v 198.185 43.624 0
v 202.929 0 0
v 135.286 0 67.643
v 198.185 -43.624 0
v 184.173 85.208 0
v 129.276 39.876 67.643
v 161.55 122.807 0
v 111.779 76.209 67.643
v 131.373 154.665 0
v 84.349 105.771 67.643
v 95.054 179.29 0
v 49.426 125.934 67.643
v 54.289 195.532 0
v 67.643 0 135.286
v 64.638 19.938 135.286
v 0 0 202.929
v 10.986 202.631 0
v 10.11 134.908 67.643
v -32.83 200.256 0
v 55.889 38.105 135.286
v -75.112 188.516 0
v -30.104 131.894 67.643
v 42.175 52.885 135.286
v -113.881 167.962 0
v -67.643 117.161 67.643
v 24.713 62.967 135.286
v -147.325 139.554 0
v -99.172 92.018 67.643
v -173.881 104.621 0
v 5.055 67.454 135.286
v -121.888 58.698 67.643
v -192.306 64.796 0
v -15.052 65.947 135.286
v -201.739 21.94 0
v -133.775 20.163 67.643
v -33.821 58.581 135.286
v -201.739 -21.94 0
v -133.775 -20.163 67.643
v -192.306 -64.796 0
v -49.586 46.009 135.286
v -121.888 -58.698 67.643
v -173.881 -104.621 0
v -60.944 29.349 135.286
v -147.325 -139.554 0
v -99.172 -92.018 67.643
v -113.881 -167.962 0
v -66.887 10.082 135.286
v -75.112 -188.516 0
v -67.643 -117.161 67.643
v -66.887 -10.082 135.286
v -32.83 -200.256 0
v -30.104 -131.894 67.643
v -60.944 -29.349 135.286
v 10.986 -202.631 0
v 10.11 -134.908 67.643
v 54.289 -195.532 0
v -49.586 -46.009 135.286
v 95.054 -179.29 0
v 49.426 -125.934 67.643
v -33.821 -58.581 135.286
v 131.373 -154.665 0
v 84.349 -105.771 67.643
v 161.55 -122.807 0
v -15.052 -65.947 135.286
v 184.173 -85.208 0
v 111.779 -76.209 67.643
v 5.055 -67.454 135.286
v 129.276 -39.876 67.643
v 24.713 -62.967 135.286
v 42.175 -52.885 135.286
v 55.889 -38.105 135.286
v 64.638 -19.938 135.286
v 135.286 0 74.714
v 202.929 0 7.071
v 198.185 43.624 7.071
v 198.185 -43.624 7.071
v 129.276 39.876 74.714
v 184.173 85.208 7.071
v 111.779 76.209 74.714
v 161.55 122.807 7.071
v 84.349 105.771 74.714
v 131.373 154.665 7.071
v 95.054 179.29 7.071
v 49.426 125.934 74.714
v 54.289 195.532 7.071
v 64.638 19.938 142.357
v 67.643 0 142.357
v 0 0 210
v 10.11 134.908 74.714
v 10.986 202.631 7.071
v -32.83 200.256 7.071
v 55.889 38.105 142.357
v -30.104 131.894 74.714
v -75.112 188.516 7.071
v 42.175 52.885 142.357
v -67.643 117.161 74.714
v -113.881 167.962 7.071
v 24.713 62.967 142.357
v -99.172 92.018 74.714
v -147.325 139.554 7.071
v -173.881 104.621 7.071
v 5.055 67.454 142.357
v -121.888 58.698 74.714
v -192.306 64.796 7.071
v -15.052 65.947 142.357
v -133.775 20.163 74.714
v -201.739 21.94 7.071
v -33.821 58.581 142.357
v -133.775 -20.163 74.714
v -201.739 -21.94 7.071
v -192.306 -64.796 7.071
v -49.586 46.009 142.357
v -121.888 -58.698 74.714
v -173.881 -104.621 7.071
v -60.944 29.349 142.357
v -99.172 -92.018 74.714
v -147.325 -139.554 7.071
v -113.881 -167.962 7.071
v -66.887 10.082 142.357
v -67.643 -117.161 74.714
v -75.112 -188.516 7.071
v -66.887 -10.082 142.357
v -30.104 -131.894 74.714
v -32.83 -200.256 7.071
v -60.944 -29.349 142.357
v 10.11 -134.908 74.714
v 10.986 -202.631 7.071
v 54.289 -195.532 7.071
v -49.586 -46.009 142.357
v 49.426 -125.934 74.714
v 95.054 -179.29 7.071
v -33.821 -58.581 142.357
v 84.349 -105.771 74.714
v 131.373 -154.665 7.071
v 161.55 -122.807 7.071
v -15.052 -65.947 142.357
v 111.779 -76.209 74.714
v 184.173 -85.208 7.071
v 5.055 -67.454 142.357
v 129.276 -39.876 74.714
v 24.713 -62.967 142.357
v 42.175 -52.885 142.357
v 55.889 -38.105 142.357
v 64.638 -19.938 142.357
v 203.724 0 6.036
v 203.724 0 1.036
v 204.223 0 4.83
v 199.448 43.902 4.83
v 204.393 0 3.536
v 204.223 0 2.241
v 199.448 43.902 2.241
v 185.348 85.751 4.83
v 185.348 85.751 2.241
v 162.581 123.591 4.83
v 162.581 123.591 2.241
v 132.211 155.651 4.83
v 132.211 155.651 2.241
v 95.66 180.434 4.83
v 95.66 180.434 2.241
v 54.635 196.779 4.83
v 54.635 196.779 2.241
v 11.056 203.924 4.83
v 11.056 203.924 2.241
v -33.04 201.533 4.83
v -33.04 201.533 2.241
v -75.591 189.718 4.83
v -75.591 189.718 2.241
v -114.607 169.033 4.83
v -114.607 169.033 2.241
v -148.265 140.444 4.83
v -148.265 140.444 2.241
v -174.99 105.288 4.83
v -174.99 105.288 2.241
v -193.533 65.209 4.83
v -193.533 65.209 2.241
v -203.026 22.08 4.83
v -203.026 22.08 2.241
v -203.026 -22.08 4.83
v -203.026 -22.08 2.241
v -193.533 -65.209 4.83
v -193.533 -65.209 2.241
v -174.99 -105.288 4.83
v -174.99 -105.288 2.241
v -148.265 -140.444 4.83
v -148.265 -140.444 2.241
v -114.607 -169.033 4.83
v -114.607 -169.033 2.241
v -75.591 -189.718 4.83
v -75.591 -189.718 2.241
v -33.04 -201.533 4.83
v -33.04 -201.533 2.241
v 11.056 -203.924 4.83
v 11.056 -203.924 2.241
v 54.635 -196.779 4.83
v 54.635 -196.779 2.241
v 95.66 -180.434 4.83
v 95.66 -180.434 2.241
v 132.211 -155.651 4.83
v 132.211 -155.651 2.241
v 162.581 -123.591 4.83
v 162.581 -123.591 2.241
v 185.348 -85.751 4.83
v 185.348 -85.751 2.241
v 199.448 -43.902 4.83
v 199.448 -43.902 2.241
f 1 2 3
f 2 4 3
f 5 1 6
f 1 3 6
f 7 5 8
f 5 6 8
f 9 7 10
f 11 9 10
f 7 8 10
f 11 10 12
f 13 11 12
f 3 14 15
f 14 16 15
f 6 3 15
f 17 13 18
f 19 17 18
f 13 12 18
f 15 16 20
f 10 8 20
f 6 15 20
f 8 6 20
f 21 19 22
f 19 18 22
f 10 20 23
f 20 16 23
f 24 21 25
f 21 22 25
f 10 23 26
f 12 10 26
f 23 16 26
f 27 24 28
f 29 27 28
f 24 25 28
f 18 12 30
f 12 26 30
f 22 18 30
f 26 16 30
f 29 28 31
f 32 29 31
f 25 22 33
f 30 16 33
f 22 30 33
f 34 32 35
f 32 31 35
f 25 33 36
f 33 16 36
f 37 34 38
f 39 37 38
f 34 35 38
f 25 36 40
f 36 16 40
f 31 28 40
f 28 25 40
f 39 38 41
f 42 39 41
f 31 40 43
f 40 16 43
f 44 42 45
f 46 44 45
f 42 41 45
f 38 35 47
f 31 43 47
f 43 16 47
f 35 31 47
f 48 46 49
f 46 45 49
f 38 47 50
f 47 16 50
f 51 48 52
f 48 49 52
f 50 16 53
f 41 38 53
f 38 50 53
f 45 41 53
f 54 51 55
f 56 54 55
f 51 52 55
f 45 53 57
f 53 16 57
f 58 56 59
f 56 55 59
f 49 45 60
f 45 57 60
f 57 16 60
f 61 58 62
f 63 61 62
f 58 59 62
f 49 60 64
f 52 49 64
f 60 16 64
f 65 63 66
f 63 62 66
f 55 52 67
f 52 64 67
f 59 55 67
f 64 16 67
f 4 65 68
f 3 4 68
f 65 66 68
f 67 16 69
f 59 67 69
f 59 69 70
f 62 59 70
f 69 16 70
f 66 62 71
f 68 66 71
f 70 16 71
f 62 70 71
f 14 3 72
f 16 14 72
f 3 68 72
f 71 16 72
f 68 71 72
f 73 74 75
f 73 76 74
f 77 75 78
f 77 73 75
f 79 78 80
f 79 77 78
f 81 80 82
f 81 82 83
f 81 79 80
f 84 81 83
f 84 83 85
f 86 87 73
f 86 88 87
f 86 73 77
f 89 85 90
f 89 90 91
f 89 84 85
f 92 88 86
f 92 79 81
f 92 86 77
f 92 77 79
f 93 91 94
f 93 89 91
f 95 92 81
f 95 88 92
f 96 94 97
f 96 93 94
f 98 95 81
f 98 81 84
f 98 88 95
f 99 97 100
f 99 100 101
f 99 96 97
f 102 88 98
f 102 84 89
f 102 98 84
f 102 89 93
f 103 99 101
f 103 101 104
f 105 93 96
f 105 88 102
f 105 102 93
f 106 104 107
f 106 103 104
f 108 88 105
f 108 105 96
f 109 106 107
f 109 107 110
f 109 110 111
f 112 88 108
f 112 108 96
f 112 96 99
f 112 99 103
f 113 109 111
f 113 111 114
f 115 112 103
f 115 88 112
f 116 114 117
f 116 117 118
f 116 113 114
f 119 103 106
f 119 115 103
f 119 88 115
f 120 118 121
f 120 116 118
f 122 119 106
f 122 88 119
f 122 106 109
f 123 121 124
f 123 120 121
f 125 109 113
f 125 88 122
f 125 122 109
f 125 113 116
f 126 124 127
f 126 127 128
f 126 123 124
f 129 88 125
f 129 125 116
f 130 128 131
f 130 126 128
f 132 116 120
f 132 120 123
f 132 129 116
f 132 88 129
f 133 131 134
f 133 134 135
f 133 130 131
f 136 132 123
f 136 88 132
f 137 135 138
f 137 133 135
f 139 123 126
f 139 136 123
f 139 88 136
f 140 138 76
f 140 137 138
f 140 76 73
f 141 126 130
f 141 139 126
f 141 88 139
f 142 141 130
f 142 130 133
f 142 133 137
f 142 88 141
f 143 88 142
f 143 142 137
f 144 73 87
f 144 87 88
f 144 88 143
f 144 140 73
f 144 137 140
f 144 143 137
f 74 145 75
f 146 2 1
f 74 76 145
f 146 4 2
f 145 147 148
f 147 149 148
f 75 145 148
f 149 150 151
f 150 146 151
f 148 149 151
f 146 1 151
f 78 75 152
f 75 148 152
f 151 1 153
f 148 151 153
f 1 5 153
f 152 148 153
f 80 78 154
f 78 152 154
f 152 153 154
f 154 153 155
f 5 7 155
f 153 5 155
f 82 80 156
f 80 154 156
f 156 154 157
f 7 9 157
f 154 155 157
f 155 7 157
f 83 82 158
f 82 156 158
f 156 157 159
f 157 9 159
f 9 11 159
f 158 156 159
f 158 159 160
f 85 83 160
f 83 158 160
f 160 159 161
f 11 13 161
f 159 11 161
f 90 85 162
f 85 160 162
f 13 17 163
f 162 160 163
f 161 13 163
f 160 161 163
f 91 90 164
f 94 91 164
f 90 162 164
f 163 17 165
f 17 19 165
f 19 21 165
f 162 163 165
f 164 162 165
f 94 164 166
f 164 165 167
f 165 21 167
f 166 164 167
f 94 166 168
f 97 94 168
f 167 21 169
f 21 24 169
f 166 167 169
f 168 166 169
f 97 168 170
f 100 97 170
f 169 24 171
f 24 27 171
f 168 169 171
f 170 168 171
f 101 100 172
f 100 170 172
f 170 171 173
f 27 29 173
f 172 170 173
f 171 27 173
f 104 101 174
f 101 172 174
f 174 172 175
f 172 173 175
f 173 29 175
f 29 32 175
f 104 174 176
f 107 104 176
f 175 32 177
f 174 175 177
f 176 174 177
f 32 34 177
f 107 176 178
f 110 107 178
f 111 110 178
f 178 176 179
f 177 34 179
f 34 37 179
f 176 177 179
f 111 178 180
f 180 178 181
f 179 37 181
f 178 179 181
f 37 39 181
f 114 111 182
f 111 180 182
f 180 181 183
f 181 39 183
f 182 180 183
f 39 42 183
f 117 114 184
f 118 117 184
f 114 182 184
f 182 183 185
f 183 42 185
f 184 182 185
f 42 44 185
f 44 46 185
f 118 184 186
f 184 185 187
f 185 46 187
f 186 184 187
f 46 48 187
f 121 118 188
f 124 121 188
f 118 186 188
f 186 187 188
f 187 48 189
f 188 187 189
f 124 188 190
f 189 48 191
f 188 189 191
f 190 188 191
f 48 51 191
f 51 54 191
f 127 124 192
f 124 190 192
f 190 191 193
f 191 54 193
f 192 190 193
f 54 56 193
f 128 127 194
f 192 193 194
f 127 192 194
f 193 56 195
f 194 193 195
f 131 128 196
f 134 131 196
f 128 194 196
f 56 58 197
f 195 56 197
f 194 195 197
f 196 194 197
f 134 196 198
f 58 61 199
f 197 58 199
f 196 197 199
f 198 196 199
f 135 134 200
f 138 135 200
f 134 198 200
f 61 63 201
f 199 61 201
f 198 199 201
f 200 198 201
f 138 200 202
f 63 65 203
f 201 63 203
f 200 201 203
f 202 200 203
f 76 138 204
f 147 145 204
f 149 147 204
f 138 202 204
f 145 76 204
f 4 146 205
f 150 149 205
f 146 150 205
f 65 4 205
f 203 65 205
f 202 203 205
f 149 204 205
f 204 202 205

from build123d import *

# Parameters (mm, degrees)
F2_T = -5


# Not quite as in the source:
# - a fillet or chamfer that OpenCascade refuses, or shapes differently, is made with other operations: its cross-section is extruded or revolved along the edge and cut away or added
# - a feature of the source that left no trace in its solid (it failed there, or was rolled back) is left out


with BuildPart() as f1:
    # F0 (on Front) → F1 (revolve)
    with BuildSketch(Plane.XZ):
        Polygon((0, 210), (0, 0), (210, 0), align=None)
    revolve(axis=Axis((0, 0, 105), (0, 0, 1)))

    # F2
    f2_openings = [f1.faces().sort_by_distance(p)[0] for p in [
        (0, 0, 0),
    ]]
    offset(amount=F2_T, openings=f2_openings)

    # F3: fillet of radius 5 on 1 edges, made by hand

    # F3_s1 → F3_t2 (revolve, cut)
    with BuildSketch(Plane.XZ):
        with BuildLine():
            ThreePointArc((202.9289321881, 7.0710678119), (204.3933982822, 3.5355339059), (202.9289321881, 0))
            Line((202.9289321881, 0), (210, 0))
            Line((210, 0), (202.9289321881, 7.0710678119))
        make_face()
    revolve(axis=Axis((0, 0, 0), (0, 0, 1)), mode=Mode.SUBTRACT)


solid = f1.part
